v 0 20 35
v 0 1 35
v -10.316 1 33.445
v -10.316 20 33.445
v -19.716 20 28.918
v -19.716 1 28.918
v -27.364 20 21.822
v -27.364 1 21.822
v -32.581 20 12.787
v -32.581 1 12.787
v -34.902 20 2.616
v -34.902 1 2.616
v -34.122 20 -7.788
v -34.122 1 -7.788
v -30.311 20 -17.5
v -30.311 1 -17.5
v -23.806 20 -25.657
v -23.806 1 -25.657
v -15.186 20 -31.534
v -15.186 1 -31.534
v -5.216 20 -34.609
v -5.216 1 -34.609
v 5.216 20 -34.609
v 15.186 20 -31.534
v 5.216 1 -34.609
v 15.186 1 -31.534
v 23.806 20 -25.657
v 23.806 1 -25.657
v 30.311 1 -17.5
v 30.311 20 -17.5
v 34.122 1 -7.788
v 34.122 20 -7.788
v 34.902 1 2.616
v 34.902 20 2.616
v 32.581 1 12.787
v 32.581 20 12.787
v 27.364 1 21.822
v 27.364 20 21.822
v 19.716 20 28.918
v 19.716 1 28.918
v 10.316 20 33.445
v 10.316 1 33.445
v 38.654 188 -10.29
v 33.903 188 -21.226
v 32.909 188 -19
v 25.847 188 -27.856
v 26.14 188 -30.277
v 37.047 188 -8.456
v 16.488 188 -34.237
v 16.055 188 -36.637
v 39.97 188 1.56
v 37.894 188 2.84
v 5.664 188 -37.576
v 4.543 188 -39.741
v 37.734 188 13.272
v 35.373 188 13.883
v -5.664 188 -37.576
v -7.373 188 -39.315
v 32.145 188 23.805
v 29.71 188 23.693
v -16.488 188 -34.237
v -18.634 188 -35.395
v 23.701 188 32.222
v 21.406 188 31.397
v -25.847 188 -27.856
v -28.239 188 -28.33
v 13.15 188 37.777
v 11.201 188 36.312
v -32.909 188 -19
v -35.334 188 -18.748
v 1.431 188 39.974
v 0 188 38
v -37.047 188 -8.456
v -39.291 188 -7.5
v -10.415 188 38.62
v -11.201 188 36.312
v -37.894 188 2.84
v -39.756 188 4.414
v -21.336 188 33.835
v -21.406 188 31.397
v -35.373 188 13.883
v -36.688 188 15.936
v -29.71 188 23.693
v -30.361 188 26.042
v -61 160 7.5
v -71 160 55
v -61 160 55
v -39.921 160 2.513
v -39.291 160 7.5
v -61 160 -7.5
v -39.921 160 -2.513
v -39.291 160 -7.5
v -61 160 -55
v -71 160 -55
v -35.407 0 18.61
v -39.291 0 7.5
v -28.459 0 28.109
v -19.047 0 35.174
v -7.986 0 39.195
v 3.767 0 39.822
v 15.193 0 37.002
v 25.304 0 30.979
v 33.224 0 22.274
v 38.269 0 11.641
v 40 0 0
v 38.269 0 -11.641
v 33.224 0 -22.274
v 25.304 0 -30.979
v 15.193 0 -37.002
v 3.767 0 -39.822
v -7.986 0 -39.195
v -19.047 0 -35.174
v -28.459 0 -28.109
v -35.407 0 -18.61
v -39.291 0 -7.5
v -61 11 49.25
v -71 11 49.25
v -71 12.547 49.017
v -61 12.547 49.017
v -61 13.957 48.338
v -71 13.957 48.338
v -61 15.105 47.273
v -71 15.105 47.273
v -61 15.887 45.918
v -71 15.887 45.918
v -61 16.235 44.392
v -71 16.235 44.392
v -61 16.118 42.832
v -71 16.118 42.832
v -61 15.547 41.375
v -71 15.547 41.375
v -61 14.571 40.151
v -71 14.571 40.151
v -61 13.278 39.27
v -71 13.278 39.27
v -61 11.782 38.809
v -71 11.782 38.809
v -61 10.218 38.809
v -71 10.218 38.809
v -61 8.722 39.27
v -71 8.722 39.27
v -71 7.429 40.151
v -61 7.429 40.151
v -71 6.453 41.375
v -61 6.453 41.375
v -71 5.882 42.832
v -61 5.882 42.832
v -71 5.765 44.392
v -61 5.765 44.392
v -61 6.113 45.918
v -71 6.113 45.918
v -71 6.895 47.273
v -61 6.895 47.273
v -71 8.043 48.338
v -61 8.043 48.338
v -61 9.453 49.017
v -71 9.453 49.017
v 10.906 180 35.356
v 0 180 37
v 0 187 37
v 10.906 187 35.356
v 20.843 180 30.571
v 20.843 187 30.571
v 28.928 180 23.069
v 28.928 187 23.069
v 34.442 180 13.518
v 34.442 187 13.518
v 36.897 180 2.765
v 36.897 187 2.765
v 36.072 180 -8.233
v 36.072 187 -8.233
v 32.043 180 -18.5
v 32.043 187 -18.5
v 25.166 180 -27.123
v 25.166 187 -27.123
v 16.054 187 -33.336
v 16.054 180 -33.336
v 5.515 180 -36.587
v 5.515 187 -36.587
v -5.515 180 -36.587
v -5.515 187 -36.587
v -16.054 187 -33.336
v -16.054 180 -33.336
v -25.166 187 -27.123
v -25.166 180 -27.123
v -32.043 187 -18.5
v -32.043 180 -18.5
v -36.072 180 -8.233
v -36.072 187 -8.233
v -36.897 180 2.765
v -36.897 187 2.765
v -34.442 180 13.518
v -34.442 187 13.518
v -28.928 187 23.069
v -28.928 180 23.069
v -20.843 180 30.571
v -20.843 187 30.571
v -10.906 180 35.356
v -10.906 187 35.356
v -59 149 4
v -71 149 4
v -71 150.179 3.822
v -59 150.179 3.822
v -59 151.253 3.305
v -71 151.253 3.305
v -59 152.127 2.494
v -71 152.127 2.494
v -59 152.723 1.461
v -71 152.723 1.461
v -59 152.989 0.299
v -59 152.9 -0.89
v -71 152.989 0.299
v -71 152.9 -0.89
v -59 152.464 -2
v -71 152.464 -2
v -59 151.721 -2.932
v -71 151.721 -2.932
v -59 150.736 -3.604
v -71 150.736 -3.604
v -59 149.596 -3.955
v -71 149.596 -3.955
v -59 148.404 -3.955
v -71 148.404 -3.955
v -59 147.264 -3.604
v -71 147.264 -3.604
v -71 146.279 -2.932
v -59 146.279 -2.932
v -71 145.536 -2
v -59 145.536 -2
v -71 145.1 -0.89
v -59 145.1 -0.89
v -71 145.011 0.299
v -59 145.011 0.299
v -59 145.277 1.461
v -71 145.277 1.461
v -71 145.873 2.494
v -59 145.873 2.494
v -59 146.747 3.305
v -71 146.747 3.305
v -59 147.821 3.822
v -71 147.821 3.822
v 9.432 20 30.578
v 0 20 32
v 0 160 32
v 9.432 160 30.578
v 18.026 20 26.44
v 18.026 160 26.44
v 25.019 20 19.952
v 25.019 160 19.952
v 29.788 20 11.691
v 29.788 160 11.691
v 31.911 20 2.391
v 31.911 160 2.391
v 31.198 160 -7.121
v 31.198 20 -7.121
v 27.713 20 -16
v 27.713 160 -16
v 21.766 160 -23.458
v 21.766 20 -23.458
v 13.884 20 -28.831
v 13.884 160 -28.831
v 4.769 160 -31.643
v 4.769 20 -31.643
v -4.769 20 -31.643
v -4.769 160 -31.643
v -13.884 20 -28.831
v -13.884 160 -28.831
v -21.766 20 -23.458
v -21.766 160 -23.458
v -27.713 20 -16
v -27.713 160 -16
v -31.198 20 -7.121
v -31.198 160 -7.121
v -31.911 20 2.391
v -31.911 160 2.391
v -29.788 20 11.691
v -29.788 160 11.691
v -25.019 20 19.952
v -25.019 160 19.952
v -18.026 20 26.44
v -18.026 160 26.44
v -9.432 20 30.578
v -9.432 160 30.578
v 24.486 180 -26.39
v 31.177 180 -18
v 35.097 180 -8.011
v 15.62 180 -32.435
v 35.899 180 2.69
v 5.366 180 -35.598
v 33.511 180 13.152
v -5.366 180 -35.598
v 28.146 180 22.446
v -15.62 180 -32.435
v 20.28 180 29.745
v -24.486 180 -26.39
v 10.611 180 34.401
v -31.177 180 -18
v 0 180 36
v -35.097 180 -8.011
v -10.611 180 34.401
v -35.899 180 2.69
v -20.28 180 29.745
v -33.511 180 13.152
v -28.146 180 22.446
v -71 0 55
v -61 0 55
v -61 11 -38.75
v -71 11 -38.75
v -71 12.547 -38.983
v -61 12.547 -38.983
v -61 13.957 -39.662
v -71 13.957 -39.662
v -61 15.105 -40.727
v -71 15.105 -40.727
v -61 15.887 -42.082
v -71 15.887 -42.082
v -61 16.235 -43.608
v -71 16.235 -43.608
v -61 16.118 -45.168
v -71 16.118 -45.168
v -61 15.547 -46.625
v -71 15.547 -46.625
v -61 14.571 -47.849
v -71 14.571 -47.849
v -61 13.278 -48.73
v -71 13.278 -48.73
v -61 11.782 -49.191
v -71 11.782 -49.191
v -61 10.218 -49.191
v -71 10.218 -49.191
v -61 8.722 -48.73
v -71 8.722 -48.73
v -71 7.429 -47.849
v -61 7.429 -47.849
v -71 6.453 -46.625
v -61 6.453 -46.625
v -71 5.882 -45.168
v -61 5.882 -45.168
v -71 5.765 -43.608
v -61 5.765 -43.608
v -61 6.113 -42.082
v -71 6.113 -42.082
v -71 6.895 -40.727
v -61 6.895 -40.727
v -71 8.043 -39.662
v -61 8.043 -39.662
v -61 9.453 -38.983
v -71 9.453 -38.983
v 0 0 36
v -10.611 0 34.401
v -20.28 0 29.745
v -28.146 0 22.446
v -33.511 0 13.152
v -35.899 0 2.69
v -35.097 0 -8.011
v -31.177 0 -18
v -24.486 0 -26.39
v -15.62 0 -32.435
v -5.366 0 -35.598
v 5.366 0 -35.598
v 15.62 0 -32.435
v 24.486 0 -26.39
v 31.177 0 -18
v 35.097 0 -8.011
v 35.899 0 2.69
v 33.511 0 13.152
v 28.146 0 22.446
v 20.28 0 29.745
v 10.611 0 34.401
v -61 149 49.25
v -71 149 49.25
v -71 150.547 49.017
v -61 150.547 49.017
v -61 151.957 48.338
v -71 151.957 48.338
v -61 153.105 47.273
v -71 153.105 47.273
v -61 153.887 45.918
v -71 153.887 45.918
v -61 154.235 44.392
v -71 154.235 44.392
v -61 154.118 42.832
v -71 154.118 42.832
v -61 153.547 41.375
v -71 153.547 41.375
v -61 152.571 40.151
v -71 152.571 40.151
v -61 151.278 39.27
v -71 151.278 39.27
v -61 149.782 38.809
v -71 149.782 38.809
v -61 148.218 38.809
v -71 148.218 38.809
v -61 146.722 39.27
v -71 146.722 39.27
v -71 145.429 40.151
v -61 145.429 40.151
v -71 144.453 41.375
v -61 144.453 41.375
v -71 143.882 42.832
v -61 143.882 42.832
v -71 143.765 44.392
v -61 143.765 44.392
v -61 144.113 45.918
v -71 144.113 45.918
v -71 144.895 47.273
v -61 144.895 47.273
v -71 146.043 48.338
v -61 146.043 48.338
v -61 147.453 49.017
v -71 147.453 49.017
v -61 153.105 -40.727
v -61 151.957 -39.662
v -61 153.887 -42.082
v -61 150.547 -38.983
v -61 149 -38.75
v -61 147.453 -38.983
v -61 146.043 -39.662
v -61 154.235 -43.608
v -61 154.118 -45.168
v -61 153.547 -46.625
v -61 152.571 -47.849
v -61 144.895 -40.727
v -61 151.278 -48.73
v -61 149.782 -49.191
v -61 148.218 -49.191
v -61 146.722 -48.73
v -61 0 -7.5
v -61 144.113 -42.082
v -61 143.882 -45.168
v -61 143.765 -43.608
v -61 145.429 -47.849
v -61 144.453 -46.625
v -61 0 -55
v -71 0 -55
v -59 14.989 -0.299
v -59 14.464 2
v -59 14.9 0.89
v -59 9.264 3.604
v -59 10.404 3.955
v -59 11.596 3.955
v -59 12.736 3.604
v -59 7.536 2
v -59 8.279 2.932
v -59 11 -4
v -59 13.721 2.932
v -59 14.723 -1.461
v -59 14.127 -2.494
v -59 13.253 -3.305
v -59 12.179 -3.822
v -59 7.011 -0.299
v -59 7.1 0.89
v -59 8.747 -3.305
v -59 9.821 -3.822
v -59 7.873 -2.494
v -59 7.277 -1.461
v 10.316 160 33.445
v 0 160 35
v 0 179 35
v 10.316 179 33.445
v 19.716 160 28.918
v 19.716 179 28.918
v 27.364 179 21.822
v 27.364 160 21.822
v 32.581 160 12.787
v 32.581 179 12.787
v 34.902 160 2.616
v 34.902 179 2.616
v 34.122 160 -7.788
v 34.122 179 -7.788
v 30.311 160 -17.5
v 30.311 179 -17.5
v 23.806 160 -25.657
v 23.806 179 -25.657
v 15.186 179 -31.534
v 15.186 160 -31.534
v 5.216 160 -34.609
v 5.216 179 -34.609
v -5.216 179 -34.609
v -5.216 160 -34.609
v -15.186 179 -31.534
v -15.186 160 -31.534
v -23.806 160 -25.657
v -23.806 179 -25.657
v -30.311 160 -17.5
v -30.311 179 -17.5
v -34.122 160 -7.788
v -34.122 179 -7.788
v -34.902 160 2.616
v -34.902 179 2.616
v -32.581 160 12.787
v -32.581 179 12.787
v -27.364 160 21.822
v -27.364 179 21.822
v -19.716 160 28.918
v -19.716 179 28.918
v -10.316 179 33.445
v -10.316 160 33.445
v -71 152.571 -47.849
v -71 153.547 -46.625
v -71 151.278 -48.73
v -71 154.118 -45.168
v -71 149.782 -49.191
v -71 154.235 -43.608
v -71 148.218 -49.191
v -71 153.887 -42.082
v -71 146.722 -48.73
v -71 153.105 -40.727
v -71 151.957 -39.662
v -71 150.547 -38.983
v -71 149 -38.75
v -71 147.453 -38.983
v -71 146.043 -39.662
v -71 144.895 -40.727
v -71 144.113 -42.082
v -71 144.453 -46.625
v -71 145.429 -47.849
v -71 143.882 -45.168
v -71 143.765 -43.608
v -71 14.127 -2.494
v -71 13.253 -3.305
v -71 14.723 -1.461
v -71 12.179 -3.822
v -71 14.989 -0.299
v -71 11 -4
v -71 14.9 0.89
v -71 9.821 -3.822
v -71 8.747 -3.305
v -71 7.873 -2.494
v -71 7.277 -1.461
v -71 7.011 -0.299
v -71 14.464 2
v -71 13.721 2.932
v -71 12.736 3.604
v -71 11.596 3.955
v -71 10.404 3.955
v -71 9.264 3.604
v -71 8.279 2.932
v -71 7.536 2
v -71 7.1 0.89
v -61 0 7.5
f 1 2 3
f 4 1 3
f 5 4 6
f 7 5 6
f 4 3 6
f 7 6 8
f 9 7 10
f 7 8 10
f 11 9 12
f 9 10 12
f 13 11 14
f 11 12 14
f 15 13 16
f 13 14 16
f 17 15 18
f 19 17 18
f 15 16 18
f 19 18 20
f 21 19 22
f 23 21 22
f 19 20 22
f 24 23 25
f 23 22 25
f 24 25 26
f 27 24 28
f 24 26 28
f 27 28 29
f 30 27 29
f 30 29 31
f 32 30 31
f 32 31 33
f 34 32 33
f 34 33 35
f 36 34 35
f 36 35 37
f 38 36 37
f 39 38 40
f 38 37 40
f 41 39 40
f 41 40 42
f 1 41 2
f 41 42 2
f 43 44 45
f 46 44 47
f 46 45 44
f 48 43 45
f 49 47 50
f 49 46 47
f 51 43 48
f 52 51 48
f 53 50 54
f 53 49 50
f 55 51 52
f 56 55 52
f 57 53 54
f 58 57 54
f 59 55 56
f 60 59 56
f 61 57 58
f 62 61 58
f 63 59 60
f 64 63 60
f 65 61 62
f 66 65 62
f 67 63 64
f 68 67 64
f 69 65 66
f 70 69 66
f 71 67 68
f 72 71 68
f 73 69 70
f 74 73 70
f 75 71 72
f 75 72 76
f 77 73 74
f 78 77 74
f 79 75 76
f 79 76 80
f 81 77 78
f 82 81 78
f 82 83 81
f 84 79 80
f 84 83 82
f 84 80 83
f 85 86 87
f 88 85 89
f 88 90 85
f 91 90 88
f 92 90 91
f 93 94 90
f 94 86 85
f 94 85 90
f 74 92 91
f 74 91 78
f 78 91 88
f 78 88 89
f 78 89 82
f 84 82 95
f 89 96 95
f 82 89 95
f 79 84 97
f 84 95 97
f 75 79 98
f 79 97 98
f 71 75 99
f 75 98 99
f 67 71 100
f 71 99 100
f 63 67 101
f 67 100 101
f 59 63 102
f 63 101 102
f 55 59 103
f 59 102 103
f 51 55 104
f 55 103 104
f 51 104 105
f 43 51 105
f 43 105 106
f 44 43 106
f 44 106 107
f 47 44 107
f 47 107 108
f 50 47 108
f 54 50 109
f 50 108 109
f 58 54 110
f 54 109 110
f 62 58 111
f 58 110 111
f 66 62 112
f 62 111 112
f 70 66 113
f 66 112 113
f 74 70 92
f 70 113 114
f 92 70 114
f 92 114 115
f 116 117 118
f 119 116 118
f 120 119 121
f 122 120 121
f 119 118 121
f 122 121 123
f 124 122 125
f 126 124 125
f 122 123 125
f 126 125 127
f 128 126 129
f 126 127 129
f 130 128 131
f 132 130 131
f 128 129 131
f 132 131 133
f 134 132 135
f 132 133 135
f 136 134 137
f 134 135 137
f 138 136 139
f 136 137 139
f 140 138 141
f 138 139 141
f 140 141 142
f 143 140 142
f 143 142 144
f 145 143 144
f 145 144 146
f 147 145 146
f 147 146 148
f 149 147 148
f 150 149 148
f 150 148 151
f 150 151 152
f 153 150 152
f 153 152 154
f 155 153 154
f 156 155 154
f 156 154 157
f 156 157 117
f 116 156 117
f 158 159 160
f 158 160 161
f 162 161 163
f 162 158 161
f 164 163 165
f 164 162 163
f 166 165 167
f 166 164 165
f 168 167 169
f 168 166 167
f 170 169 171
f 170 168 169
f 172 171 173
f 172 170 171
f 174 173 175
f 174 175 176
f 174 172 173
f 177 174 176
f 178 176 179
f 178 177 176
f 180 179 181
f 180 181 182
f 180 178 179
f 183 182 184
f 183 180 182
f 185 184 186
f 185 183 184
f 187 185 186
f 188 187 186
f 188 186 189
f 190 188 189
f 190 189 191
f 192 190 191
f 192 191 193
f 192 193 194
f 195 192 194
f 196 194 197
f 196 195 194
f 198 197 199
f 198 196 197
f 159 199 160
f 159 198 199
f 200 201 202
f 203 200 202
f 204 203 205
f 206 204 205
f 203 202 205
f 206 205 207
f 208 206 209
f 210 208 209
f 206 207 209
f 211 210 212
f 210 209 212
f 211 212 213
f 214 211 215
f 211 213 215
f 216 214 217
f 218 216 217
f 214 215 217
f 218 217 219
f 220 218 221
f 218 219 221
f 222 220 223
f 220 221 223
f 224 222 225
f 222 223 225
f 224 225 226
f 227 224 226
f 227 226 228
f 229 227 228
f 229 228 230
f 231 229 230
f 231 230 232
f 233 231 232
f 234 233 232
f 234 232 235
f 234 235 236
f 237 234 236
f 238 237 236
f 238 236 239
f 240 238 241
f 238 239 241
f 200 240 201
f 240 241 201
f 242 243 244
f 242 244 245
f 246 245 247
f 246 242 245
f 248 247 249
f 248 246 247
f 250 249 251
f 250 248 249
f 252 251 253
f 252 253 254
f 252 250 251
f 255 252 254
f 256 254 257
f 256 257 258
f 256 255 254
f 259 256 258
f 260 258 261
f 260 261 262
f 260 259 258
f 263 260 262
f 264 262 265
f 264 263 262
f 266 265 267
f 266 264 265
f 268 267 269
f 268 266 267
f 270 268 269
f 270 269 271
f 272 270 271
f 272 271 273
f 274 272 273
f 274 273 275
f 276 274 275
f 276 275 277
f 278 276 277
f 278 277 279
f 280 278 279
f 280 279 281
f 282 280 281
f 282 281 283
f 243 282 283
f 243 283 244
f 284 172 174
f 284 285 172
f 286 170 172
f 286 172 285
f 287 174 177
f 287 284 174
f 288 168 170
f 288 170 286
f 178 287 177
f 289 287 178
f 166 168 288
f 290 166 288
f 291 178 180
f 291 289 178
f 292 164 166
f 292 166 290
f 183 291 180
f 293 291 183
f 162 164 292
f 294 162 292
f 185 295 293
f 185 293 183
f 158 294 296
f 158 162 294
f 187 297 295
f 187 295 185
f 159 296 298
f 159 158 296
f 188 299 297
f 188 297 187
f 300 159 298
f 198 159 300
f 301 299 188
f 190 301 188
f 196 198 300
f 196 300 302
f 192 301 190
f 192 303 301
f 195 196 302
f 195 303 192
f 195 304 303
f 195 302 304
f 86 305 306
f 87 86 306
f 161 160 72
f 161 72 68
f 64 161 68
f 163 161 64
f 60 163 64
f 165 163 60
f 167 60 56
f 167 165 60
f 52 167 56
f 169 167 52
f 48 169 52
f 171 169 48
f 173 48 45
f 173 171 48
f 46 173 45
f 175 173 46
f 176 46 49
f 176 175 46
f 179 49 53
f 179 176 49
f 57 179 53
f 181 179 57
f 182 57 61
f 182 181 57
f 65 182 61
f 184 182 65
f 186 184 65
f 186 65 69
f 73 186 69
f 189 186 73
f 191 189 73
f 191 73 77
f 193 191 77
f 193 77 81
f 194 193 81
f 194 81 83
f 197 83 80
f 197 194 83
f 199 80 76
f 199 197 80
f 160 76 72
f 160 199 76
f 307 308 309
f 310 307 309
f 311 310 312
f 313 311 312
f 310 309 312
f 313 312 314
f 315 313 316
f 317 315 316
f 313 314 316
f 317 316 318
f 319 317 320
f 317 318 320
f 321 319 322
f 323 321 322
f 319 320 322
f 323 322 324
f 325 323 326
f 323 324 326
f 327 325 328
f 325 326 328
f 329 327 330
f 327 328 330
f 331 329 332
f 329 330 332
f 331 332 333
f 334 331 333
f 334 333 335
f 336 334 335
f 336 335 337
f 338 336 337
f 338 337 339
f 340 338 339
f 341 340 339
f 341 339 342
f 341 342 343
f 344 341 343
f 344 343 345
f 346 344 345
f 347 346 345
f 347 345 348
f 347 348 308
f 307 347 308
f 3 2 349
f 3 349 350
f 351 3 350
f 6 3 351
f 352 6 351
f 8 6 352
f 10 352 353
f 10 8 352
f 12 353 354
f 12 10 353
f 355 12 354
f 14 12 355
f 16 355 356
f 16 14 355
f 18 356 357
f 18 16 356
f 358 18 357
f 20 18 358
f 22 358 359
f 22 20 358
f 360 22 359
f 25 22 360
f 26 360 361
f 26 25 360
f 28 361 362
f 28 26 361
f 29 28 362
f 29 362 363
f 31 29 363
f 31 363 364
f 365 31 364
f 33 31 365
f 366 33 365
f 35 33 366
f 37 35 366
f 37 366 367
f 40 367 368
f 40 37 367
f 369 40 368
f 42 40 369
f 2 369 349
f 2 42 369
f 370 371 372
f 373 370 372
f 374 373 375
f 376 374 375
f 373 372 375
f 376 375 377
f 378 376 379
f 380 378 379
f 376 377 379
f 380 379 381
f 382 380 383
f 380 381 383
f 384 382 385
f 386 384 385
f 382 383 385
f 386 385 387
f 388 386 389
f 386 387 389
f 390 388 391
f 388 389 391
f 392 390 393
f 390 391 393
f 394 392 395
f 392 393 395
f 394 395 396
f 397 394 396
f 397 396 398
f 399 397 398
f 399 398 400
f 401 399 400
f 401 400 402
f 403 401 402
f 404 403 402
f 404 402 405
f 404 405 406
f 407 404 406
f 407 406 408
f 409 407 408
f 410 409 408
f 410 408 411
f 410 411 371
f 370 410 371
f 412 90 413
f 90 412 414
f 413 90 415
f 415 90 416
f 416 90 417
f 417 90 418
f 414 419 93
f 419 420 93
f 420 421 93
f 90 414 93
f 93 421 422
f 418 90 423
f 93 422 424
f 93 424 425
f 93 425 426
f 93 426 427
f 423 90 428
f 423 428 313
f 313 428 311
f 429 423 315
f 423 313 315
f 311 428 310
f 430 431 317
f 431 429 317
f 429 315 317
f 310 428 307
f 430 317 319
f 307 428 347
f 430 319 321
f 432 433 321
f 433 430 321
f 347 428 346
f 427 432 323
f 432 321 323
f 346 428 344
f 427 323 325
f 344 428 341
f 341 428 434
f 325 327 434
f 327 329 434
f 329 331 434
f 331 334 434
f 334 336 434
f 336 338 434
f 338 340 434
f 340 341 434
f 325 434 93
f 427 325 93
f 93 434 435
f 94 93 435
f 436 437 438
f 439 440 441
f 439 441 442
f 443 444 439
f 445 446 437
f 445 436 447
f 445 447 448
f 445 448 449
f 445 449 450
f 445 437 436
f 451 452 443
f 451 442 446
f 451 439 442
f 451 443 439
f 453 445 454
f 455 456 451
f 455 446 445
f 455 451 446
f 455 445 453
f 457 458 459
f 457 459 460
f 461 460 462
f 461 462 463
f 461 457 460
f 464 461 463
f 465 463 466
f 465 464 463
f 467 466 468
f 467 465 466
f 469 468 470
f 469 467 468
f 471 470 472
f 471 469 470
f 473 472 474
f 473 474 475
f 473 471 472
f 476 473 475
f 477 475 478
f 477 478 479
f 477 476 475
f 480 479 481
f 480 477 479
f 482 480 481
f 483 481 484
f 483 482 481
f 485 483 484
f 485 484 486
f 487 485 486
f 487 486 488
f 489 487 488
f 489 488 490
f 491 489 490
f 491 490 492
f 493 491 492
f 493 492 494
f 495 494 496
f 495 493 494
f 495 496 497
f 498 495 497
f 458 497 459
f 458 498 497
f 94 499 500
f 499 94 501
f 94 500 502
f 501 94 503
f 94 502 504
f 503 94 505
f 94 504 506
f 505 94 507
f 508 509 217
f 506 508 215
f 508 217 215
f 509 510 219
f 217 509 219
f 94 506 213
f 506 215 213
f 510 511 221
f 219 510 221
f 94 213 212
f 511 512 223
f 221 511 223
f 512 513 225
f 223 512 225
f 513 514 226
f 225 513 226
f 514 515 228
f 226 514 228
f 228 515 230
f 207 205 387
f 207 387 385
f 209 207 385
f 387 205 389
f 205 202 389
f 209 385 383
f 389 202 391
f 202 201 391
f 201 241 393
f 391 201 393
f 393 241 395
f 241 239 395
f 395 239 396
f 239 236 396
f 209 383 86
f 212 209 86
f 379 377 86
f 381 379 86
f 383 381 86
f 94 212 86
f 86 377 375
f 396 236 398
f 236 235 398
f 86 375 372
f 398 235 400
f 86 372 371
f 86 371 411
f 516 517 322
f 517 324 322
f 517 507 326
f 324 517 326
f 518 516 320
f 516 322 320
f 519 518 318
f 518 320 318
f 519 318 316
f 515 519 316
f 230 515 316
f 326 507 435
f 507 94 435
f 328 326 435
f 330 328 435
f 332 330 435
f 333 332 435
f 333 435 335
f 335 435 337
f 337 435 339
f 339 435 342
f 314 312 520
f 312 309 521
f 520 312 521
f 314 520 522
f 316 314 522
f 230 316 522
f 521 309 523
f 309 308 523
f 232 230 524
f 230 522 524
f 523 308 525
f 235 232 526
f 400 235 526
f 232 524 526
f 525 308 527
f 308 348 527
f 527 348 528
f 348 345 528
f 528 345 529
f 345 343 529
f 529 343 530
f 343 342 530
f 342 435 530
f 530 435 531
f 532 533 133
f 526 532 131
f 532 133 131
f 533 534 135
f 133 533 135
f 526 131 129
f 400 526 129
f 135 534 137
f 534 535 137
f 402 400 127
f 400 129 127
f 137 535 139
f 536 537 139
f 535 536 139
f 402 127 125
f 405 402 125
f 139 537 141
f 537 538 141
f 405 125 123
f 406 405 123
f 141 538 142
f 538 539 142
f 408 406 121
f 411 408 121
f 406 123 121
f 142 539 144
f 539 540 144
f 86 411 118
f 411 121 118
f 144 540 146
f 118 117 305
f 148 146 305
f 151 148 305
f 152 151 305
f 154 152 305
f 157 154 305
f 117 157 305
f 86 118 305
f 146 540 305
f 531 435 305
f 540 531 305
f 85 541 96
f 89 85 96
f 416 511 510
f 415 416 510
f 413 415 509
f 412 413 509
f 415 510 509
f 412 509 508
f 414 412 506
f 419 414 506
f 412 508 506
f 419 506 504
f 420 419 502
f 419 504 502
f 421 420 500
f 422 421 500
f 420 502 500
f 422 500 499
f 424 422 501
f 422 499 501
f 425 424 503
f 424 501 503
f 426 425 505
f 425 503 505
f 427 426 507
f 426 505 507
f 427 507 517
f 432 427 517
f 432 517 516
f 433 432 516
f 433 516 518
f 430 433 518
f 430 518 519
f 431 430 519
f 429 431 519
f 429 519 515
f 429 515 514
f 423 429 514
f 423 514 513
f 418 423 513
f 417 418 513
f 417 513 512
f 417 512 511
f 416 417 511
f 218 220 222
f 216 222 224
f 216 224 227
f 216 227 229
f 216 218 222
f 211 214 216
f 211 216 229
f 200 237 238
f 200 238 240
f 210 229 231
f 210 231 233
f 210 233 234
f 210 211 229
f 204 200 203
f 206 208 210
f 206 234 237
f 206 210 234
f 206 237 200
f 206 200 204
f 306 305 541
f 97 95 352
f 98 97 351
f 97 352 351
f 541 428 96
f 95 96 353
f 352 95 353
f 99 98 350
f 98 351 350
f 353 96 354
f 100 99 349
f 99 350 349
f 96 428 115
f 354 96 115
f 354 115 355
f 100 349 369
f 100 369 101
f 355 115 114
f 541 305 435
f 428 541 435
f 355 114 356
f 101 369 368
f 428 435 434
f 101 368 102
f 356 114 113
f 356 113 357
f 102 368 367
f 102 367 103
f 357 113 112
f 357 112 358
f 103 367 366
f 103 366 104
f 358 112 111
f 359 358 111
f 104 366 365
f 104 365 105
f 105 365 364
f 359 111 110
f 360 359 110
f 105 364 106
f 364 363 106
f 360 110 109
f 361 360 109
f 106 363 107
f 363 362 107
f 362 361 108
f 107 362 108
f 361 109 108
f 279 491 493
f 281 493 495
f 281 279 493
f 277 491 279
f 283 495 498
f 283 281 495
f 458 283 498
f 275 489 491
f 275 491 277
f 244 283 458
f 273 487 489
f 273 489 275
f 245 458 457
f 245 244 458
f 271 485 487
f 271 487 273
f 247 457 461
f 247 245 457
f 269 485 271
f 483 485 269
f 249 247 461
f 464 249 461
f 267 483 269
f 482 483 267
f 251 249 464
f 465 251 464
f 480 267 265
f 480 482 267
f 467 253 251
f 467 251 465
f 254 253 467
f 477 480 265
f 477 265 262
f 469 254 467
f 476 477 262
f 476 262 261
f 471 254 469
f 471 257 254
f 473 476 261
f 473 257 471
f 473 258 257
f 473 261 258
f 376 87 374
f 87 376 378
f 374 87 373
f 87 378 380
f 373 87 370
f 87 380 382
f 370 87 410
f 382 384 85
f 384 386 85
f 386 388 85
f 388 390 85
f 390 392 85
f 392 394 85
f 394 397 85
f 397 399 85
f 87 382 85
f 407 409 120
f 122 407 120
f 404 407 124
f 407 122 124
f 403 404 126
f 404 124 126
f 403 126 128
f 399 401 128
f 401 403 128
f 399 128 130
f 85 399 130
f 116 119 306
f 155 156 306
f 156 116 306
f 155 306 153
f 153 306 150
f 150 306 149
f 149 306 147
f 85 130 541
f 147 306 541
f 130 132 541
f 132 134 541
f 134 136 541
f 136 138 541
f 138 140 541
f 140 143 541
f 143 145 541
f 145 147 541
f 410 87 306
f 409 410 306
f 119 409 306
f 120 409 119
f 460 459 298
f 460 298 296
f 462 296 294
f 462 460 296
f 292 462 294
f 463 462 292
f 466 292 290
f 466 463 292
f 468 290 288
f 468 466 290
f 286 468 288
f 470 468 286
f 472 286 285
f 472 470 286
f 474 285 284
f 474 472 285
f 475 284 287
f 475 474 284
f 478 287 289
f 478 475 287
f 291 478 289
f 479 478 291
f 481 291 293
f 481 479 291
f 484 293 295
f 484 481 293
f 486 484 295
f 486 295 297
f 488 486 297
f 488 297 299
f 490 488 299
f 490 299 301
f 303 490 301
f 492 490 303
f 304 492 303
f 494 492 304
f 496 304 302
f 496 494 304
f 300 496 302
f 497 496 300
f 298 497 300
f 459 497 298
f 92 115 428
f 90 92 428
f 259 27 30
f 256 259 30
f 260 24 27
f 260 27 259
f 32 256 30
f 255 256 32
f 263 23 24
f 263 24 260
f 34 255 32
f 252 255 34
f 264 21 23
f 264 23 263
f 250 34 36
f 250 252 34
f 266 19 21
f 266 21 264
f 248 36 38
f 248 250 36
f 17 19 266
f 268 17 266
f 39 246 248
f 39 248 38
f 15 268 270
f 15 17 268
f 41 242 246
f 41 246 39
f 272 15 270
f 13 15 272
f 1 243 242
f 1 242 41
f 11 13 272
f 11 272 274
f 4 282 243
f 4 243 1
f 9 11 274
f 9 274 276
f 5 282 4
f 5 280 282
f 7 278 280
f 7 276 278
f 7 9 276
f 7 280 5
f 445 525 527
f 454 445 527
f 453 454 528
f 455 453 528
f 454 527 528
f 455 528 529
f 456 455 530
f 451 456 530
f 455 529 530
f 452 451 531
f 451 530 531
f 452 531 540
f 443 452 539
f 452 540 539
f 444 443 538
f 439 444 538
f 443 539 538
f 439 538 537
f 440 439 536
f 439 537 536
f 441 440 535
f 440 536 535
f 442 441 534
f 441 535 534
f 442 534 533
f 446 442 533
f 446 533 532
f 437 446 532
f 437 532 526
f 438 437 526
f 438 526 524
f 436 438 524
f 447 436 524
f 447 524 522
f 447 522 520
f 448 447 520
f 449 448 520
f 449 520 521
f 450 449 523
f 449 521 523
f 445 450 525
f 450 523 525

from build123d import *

# Parameters (mm, degrees)
SCHIZZO1_R        = 32
ESTRUSIONE1_DEPTH = 160
SCHIZZO2_R        = 40
SCHIZZO2_R_2      = 35
ESTRUSIONE2_DEPTH = 20
SCHIZZO4_R        = 5.25
ESTRUSIONE4_DEPTH = 20
SCHIZZO5_R        = 4
ESTRUSIONE5_DEPTH = 12
SCHIZZO6_R        = 40
SCHIZZO6_R_2      = 37
ESTRUSIONE6_DEPTH = 8
SCHIZZO7_R        = 35
ESTRUSIONE7_DEPTH = 20
SMUSSO1_SIZE      = 1


with BuildPart() as part:
    # Schizzo1 → Estrusione1 (new body)
    with BuildSketch(Plane(origin=(0, 0, 0), x_dir=(1, 0, 0), z_dir=(0, 1, 0))):
        with BuildLine():
            Line((-39.290584114, 7.5), (-61, 7.5))
            Line((-61, 7.5), (-61, 55))
            Line((-61, 55), (-71, 55))
            Line((-71, 55), (-71, -55))
            Line((-71, -55), (-61, -55))
            Line((-61, -55), (-61, -7.5))
            Line((-61, -7.5), (-39.290584114, -7.5))
            ThreePointArc((-39.290584114, -7.5), (40, 0), (-39.290584114, 7.5))
        make_face()
        with Locations(Location((0, 0, 0), (0, 0, 270))):
            Circle(SCHIZZO1_R, mode=Mode.SUBTRACT)
    extrude(amount=ESTRUSIONE1_DEPTH)

    # Schizzo2 → Estrusione2 (add)
    with BuildSketch(Plane(origin=(0, 160, 0), x_dir=(1, 0, 0), z_dir=(0, 1, 0))):
        with Locations(Location((0, 0, 0), (0, 0, 169.193077125))):
            Circle(SCHIZZO2_R)
        with Locations(Location((0, 0, 0), (0, 0, 270))):
            Circle(SCHIZZO2_R_2, mode=Mode.SUBTRACT)
    extrude(amount=ESTRUSIONE2_DEPTH)

    # Schizzo4 → Estrusione4 (cut)
    with BuildSketch(Plane.ZY.offset(71)):
        with Locations((-44, 149)):
            Circle(SCHIZZO4_R)
        with Locations((44, 149)):
            Circle(SCHIZZO4_R)
        with Locations((44, 11)):
            Circle(SCHIZZO4_R)
        with Locations((-44, 11)):
            Circle(SCHIZZO4_R)
    extrude(amount=-ESTRUSIONE4_DEPTH, mode=Mode.SUBTRACT)

    # Schizzo5 → Estrusione5 (cut)
    with BuildSketch(Plane.ZY.offset(71)):
        with Locations((0, 149)):
            Circle(SCHIZZO5_R)
        with Locations(Location((0, 11, 0), (0, 0, 180))):
            Circle(SCHIZZO5_R)
    extrude(amount=-ESTRUSIONE5_DEPTH, mode=Mode.SUBTRACT)

    # Schizzo6 → Estrusione6 (add)
    with BuildSketch(Plane(origin=(0, 180, 0), x_dir=(1, 0, 0), z_dir=(0, 1, 0))):
        with Locations(Location((0, 0, 0), (0, 0, 169.193077125))):
            Circle(SCHIZZO6_R)
        with Locations(Location((0, 0, 0), (0, 0, 270))):
            Circle(SCHIZZO6_R_2, mode=Mode.SUBTRACT)
    extrude(amount=ESTRUSIONE6_DEPTH)

    # Schizzo7 → Estrusione7 (cut)
    with BuildSketch(Plane.XZ):
        with Locations(Location((0, 0, 0), (0, 0, 90))):
            Circle(SCHIZZO7_R)
    extrude(amount=-ESTRUSIONE7_DEPTH, mode=Mode.SUBTRACT)

    # Smusso1
    smusso1_edges = [part.edges().sort_by_distance(p)[0] for p in [
        (0, 180, -35),
        (0, 188, -37),
        (0, 0, -35),
    ]]
    chamfer(smusso1_edges, length=SMUSSO1_SIZE)


solid = part.part
